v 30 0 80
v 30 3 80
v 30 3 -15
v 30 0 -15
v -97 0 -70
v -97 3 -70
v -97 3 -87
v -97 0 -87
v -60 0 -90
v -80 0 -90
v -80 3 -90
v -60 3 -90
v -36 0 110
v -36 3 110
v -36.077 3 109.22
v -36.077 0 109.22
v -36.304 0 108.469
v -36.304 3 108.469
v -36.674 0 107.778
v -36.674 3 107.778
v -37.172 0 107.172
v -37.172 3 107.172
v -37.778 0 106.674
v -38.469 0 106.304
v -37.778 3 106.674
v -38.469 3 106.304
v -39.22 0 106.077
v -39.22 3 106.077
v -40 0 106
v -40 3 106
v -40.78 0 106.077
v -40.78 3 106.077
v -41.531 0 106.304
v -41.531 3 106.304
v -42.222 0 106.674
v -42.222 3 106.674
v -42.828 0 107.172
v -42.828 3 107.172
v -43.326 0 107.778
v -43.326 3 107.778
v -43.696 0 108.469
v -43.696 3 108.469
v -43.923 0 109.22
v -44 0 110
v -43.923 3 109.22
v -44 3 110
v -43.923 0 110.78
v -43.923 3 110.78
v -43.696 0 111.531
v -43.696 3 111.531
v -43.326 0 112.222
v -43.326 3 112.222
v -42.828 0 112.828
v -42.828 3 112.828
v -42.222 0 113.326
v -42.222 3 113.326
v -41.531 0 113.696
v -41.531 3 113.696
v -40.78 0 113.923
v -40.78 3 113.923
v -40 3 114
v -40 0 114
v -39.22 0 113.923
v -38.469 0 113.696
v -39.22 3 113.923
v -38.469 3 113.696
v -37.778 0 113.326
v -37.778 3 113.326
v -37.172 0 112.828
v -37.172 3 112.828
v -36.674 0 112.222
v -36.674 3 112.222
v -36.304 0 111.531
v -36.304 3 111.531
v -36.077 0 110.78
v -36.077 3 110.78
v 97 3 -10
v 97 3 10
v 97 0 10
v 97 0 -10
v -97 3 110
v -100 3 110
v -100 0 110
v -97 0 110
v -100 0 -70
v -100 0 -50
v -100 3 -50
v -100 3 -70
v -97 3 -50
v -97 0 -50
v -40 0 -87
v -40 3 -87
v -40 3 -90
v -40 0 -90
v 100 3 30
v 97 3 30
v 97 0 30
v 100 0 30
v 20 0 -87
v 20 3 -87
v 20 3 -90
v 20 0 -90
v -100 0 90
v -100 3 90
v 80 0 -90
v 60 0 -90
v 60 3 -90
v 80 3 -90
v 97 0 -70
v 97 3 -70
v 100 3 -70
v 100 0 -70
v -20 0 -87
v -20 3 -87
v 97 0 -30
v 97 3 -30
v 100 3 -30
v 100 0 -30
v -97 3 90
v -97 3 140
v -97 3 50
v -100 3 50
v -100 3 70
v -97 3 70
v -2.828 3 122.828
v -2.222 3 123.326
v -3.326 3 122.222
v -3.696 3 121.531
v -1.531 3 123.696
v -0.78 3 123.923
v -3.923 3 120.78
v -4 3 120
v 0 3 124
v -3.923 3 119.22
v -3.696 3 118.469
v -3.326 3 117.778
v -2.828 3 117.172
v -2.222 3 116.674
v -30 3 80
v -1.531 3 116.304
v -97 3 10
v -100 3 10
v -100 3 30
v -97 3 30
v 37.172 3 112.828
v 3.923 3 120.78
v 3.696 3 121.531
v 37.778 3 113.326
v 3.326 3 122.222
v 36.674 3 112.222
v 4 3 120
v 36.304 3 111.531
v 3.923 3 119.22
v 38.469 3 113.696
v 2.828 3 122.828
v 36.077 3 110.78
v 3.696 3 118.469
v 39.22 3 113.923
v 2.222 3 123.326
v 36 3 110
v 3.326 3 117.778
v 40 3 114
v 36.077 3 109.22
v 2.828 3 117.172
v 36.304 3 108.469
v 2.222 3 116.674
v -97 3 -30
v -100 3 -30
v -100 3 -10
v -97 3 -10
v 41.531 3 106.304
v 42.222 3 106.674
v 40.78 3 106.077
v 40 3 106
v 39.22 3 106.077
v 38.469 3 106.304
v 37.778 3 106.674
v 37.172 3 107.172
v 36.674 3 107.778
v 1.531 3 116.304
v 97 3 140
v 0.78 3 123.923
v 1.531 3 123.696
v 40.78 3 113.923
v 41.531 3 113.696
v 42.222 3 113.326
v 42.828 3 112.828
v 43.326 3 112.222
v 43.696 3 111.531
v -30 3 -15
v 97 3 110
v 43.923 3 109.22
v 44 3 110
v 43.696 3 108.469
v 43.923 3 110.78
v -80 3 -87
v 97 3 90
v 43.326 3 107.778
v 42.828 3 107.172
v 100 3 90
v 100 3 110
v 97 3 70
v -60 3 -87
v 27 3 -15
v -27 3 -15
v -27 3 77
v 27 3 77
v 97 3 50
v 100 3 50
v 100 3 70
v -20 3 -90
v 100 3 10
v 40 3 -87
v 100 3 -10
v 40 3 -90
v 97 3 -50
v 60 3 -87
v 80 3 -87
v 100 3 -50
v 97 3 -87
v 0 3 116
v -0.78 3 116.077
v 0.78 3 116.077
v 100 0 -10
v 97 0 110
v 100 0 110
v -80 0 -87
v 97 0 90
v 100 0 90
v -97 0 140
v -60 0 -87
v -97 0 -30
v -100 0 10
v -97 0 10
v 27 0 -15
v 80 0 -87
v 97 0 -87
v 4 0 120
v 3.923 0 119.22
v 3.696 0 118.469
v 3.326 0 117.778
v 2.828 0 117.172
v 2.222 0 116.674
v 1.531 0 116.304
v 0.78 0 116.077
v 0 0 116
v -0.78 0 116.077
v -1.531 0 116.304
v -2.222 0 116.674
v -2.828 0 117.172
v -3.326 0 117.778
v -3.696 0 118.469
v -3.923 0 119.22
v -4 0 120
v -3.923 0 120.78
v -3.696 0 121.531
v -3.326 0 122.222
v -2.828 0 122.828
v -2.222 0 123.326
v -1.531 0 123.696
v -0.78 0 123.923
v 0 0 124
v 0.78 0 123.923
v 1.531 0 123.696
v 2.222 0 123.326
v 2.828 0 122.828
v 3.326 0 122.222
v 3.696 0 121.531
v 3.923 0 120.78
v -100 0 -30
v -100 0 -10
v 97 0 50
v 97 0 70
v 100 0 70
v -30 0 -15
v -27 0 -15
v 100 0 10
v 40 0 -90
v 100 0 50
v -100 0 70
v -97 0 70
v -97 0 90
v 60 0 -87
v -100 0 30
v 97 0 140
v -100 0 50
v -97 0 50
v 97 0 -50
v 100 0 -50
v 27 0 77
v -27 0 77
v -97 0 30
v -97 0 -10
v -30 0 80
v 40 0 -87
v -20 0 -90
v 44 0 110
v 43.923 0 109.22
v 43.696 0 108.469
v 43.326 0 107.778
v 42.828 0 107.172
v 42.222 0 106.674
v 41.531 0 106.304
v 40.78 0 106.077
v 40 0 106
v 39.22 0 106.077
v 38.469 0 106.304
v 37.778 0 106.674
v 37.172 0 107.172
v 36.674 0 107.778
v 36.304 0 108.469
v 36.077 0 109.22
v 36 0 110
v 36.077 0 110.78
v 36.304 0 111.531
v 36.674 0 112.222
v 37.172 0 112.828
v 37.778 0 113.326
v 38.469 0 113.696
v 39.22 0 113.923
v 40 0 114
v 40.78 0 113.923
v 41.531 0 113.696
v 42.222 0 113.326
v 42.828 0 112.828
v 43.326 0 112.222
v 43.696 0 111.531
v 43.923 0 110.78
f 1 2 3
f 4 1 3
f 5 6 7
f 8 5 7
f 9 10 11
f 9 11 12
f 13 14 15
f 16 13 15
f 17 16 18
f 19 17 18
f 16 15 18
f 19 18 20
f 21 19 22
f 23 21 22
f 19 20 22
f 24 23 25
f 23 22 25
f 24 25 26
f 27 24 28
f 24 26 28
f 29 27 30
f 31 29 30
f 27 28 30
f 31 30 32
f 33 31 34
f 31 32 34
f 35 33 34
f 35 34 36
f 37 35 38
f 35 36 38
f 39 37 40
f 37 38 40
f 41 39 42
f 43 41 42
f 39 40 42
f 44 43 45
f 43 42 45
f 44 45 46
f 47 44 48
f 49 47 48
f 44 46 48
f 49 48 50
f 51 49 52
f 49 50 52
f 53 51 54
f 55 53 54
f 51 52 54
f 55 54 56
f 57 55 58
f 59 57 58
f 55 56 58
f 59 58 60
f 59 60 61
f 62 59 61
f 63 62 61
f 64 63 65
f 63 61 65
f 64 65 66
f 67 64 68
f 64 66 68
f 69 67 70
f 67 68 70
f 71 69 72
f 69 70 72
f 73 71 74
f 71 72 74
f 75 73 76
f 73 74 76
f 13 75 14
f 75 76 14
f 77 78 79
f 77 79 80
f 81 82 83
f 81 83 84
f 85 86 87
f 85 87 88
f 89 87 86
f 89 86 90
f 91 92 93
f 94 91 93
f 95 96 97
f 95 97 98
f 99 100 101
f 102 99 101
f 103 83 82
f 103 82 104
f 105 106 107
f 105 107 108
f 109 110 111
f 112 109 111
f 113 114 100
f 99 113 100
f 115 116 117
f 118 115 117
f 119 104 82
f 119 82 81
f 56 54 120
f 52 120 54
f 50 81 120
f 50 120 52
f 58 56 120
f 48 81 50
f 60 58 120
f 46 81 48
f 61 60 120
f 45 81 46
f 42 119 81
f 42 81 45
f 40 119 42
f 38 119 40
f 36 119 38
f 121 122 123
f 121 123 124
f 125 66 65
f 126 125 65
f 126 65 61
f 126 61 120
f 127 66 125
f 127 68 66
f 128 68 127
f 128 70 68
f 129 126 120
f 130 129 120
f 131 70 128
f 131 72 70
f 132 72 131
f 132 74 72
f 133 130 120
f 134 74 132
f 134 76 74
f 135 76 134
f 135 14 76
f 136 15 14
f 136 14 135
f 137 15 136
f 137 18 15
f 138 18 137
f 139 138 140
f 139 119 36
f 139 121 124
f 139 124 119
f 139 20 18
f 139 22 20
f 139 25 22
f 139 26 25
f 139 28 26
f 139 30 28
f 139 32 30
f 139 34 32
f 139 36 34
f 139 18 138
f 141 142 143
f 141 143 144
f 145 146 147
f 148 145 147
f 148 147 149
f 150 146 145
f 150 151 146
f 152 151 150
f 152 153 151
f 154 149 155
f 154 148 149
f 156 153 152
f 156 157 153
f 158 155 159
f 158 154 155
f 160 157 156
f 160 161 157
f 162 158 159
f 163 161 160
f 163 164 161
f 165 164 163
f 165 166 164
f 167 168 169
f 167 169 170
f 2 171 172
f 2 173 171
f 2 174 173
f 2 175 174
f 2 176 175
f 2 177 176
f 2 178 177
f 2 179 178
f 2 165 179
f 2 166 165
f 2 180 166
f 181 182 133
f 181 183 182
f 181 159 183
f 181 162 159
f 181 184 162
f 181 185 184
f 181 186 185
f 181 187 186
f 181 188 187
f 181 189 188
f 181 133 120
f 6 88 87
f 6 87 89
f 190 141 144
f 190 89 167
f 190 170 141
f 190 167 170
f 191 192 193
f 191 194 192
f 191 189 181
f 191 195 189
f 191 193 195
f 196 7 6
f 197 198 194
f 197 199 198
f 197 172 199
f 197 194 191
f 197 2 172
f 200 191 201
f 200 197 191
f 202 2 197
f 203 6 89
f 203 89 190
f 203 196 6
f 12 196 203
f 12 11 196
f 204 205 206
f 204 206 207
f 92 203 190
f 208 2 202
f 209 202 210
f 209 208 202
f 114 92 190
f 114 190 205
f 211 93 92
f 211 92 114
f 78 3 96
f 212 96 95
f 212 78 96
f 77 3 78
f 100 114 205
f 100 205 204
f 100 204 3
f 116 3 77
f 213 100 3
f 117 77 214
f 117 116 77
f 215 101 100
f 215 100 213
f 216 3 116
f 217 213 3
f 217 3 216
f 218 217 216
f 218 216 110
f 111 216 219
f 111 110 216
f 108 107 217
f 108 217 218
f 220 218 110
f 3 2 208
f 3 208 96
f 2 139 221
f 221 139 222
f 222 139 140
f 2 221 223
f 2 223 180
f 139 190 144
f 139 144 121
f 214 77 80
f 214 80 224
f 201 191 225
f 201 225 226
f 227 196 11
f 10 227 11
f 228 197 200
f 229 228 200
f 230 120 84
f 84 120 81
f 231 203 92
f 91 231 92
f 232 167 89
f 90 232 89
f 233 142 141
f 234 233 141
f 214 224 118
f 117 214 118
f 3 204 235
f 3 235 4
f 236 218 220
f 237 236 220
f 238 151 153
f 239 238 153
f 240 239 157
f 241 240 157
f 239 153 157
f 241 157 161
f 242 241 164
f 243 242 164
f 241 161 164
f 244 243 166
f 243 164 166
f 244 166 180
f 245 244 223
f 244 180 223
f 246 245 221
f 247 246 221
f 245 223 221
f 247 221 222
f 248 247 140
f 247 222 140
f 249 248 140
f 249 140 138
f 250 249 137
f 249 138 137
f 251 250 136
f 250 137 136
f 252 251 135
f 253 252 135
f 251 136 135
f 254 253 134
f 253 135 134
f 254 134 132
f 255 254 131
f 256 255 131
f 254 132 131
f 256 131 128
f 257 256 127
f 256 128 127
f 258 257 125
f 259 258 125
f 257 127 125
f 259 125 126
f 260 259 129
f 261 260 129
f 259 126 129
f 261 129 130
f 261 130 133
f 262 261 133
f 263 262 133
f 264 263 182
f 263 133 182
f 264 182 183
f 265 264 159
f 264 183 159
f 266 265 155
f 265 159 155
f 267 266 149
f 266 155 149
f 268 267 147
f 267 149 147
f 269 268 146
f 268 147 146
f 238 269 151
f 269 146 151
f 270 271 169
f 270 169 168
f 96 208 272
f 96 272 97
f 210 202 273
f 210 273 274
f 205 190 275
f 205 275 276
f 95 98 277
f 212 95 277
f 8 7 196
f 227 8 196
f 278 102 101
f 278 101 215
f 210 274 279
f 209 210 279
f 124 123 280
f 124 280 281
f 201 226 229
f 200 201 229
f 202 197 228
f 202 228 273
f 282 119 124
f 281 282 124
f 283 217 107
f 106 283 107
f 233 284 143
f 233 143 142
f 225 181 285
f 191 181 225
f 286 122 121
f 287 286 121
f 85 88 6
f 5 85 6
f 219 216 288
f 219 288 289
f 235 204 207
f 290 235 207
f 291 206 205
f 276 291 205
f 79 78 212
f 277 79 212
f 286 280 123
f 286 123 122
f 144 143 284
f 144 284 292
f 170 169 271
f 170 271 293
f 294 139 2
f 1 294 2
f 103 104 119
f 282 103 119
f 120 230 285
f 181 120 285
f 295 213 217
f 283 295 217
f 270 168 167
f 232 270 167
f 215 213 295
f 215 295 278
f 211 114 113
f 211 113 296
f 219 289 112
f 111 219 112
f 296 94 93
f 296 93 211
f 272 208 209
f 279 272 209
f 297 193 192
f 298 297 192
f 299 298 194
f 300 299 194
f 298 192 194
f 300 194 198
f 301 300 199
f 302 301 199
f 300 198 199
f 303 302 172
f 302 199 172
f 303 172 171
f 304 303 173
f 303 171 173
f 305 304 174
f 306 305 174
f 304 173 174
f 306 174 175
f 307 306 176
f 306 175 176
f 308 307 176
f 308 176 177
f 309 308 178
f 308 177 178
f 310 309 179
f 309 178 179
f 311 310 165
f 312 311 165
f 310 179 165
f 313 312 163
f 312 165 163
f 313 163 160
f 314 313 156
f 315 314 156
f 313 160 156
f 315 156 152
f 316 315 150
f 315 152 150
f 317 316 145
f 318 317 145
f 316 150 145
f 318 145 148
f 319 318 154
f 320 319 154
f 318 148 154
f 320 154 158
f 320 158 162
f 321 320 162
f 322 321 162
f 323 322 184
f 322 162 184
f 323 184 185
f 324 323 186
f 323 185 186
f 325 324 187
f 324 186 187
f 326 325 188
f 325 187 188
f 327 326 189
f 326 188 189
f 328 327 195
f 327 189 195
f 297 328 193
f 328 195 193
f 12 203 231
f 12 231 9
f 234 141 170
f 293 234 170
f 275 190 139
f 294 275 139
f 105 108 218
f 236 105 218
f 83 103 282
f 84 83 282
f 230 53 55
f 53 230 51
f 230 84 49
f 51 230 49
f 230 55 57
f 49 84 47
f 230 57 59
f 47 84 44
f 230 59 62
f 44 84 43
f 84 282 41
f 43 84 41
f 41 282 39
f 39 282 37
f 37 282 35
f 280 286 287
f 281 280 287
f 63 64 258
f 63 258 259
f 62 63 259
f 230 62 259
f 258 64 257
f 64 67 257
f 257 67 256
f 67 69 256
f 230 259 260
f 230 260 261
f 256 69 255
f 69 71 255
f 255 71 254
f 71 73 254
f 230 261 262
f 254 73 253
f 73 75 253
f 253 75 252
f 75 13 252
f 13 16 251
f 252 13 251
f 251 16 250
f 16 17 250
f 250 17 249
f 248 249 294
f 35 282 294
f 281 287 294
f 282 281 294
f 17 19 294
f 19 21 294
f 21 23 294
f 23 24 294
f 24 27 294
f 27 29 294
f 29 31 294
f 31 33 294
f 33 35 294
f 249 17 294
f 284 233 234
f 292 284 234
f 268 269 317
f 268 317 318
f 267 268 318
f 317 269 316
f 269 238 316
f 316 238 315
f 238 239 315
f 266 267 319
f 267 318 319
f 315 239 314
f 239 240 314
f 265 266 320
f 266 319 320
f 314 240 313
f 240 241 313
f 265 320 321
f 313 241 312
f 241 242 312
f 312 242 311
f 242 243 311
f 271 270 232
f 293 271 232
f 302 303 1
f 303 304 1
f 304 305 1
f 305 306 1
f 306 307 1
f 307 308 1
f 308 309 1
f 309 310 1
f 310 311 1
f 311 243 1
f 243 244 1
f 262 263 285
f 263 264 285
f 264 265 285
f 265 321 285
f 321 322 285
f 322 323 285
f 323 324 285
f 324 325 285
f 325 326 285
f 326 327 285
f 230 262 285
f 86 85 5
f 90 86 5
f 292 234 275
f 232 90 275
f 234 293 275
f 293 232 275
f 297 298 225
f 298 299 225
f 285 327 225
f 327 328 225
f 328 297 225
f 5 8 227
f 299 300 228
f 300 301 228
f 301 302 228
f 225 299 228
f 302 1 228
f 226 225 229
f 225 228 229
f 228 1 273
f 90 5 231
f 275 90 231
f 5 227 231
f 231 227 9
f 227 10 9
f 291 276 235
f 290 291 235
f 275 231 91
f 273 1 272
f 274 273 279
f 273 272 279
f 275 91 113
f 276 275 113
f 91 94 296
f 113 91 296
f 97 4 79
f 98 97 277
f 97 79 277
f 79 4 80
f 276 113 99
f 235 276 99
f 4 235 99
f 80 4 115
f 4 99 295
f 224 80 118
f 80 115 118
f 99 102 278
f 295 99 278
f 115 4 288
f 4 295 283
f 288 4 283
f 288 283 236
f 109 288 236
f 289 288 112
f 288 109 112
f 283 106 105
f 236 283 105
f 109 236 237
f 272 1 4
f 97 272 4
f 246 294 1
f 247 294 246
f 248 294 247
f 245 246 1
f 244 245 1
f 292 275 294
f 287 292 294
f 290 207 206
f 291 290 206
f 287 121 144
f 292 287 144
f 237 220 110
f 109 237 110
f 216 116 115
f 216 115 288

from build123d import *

# Parameters (mm, degrees)
SKETCH1_W           = 200
SKETCH1_H           = 230
BOSS_EXTRUDE1_DEPTH = 3
CUT_EXTRUDE2_DEPTH  = 3
SKETCH5_W           = 3
SKETCH5_H           = 20
SKETCH5_W_2         = 20
SKETCH5_H_2         = 3
SKETCH5_W_3         = 40
CUT_EXTRUDE4_DEPTH  = 3
SKETCH6_W           = 3
SKETCH6_H           = 5
BOSS_EXTRUDE2_DEPTH = 3
SKETCH7_W           = 3
SKETCH7_H           = 10
CUT_EXTRUDE5_DEPTH  = 3
SKETCH8_R           = 4
CUT_EXTRUDE6_DEPTH  = 3


with BuildPart() as part:
    # Sketch1 → Boss-Extrude1 (new body)
    with BuildSketch(Plane(origin=(0, 0, 0), x_dir=(1, 0, 0), z_dir=(0, 1, 0))):
        with Locations((0, -25)):
            Rectangle(SKETCH1_W, SKETCH1_H)
    extrude(amount=BOSS_EXTRUDE1_DEPTH)

    # Sketch2 → Cut-Extrude2 (cut)
    with BuildSketch(Plane(origin=(0, 3, 0), x_dir=(1, 0, 0), z_dir=(0, 1, 0))):
        Polygon((-30, -80), (30, -80), (30, 20), (27, 20), (27, -77), (-27, -77), (-27, 20), (-30, 20), align=None)
    extrude(amount=-CUT_EXTRUDE2_DEPTH, mode=Mode.SUBTRACT)

    # Sketch5 → Cut-Extrude4 (cut)
    with BuildSketch(Plane(origin=(0, 3, 0), x_dir=(1, 0, 0), z_dir=(0, 1, 0))):
        with Locations((98.5, -120)):
            Rectangle(SKETCH5_W, SKETCH5_H)
        Polygon((100, 90), (80, 90), (80, 87), (97, 87), (97, 70), (100, 70), align=None)
        Polygon((-100, 90), (-100, 70), (-97, 70), (-97, 87), (-80, 87), (-80, 90), align=None)
        with Locations((98.5, 40)):
            Rectangle(SKETCH5_W, SKETCH5_H)
        with Locations((98.5, 0)):
            Rectangle(SKETCH5_W, SKETCH5_H)
        with Locations((98.5, -40)):
            Rectangle(SKETCH5_W, SKETCH5_H)
        with Locations((98.5, -80)):
            Rectangle(SKETCH5_W, SKETCH5_H)
        with Locations((-98.5, 40)):
            Rectangle(SKETCH5_W, SKETCH5_H)
        with Locations((-98.5, 0)):
            Rectangle(SKETCH5_W, SKETCH5_H)
        with Locations((-98.5, -40)):
            Rectangle(SKETCH5_W, SKETCH5_H)
        with Locations((-98.5, -80)):
            Rectangle(SKETCH5_W, SKETCH5_H)
        with Locations((-98.5, -120)):
            Rectangle(SKETCH5_W, SKETCH5_H)
        with Locations((50, 88.5)):
            Rectangle(SKETCH5_W_2, SKETCH5_H_2)
        with Locations((0, 88.5)):
            Rectangle(SKETCH5_W_3, SKETCH5_H_2)
        with Locations((-50, 88.5)):
            Rectangle(SKETCH5_W_2, SKETCH5_H_2)
    extrude(amount=-CUT_EXTRUDE4_DEPTH, mode=Mode.SUBTRACT)

    # Sketch6 → Boss-Extrude2 (add)
    with BuildSketch(Plane(origin=(0, 3, 0), x_dir=(1, 0, 0), z_dir=(0, 1, 0))):
        with Locations((28.5, 17.5)):
            Rectangle(SKETCH6_W, SKETCH6_H)
        with Locations((-28.5, 17.5)):
            Rectangle(SKETCH6_W, SKETCH6_H)
    extrude(amount=-BOSS_EXTRUDE2_DEPTH)

    # Sketch7 → Cut-Extrude5 (cut)
    with BuildSketch(Plane(origin=(0, 3, 0), x_dir=(1, 0, 0), z_dir=(0, 1, 0))):
        with Locations((98.5, -135)):
            Rectangle(SKETCH7_W, SKETCH7_H)
        with Locations((-98.5, -135)):
            Rectangle(SKETCH7_W, SKETCH7_H)
    extrude(amount=-CUT_EXTRUDE5_DEPTH, mode=Mode.SUBTRACT)

    # Sketch8 → Cut-Extrude6 (cut)
    with BuildSketch(Plane(origin=(0, 3, 0), x_dir=(1, 0, 0), z_dir=(0, 1, 0))):
        with Locations((0, -120)):
            Circle(SKETCH8_R)
        with Locations((40, -110)):
            Circle(SKETCH8_R)
        with Locations((-40, -110)):
            Circle(SKETCH8_R)
    extrude(amount=-CUT_EXTRUDE6_DEPTH, mode=Mode.SUBTRACT)


solid = part.part
